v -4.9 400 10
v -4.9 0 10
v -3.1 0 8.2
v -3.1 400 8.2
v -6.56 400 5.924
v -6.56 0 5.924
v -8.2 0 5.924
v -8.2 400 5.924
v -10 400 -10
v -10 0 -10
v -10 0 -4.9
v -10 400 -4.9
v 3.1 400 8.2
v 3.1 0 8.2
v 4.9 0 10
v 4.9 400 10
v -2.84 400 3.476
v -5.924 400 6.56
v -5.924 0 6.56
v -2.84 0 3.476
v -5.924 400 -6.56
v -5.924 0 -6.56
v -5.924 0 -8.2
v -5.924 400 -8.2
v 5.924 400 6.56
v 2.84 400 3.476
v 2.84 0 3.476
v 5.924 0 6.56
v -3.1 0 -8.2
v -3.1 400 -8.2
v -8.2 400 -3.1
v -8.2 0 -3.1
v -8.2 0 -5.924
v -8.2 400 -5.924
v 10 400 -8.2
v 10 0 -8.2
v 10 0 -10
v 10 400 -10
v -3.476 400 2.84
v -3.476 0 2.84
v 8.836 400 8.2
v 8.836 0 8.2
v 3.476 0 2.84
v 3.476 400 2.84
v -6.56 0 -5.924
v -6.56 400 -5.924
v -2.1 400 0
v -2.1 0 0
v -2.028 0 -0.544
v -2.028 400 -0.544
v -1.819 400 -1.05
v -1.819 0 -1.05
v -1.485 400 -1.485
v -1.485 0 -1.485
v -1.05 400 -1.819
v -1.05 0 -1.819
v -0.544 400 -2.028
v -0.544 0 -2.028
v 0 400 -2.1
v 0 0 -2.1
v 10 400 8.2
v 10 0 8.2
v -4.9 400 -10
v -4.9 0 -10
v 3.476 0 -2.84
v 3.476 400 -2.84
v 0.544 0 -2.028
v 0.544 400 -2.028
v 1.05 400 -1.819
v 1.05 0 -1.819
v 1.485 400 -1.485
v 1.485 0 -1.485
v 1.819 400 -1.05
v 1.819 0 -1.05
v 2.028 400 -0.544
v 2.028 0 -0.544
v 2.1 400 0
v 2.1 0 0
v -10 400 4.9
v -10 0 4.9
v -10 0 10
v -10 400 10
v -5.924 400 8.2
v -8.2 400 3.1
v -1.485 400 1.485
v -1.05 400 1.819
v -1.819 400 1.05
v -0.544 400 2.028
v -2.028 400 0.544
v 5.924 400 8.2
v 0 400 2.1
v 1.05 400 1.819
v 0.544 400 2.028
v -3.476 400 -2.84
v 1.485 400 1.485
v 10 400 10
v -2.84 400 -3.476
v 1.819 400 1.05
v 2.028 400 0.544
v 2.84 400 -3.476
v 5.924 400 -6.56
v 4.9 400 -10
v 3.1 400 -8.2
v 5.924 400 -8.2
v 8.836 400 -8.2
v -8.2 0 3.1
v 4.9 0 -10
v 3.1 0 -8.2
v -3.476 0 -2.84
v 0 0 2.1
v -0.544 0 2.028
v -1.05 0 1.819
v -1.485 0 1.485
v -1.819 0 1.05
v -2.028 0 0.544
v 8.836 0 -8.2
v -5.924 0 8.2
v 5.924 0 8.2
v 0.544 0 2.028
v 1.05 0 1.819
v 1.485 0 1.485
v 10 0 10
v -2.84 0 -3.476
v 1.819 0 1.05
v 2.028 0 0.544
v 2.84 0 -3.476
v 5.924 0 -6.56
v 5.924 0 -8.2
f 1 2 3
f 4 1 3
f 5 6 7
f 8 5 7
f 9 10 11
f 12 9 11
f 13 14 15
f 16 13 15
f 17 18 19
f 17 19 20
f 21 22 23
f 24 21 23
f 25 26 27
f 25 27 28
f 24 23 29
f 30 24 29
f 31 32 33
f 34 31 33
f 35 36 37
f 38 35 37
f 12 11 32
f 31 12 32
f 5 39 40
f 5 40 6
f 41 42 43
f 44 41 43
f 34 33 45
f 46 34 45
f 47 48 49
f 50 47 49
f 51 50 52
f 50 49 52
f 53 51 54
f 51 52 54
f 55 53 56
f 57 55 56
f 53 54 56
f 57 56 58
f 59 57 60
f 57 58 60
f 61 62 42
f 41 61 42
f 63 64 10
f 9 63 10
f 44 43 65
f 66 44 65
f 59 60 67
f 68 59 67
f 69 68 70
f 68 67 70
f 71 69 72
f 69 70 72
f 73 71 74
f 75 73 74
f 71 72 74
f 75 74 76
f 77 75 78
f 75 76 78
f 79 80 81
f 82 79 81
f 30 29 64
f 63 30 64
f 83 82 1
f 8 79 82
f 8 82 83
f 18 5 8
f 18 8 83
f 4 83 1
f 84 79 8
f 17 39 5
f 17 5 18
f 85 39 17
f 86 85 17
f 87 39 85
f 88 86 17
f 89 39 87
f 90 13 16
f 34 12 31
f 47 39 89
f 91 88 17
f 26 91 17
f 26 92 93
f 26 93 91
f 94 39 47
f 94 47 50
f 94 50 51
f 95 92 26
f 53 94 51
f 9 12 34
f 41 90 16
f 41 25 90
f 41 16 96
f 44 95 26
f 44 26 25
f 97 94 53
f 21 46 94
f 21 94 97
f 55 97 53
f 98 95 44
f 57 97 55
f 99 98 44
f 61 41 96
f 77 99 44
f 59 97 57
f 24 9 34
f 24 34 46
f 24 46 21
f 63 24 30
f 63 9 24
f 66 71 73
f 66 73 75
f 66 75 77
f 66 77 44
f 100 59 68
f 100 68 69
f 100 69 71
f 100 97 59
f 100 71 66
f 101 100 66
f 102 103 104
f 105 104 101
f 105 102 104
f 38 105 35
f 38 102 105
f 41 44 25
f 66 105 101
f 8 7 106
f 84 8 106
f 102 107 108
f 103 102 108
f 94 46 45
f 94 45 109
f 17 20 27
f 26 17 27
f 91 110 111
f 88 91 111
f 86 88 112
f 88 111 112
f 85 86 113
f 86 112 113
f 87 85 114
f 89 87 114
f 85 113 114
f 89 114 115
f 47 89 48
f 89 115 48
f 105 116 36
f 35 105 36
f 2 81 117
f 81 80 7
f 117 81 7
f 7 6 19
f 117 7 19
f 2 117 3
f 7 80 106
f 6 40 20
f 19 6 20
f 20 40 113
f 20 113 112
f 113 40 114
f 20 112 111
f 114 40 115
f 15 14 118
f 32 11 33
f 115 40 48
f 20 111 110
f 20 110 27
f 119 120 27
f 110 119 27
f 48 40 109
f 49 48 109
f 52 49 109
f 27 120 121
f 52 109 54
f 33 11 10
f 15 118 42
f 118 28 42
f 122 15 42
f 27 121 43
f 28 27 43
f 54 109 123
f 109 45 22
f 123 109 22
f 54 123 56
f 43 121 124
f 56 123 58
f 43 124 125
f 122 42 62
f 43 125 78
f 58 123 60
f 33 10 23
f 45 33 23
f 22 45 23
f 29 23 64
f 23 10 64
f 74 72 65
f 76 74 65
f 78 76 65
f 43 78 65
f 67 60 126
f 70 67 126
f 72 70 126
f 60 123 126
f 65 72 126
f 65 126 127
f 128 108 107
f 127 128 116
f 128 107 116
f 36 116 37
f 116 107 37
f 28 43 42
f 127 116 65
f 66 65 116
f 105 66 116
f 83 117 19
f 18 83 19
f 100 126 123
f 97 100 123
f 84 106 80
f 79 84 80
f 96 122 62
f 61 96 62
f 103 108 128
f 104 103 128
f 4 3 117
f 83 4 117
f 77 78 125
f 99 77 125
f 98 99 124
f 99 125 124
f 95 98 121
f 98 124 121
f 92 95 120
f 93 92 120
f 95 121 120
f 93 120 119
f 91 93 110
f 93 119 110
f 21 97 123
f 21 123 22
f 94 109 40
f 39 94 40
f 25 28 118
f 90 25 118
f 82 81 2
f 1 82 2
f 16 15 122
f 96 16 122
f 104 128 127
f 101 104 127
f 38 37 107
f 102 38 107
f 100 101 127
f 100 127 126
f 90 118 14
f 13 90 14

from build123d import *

# Parameters (mm, degrees)
EXTRUDE_1_DEPTH          = 400
CUT_EXTRUDE_1_DEPTH      = 404.236903073
CUT_EXTRUDE_1_DEPTH_BACK = 404.236903073
SKETCH_2_W               = 44.352947912
SKETCH_2_H               = 26.447385174


with BuildPart() as part:
    # 草图1 → 凸台-拉伸1 (new body)
    with BuildSketch(Plane(origin=(0, 0, 0), x_dir=(1, 0, 0), z_dir=(0, 1, 0))):
        with BuildLine():
            Line((-3.476396103, 2.84), (-3.476396103, 0))
            Line((-3.476396103, 0), (-2.1, 0))
            ThreePointArc((-2.1, 0), (-1.48492424, 1.48492424), (0, 2.1))
            Line((0, 2.1), (0, 3.476396103))
            Line((0, 3.476396103), (-2.84, 3.476396103))
            Line((-2.84, 3.476396103), (-5.923603897, 6.56))
            Line((-5.923603897, 6.56), (-5.923603897, 8.2))
            Line((-5.923603897, 8.2), (-3.1, 8.2))
            Line((-3.1, 8.2), (-4.9, 10))
            Line((-4.9, 10), (-10, 10))
            Line((-10, 10), (-10, 4.9))
            Line((-10, 4.9), (-8.2, 3.1))
            Line((-8.2, 3.1), (-8.2, 5.923603897))
            Line((-8.2, 5.923603897), (-6.56, 5.923603897))
            Line((-6.56, 5.923603897), (-3.476396103, 2.84))
        make_face()
        with BuildLine():
            Line((-2.1, 0), (-3.476396103, 0))
            Line((-3.476396103, 0), (-3.476396103, -2.84))
            Line((-3.476396103, -2.84), (-6.56, -5.923603897))
            Line((-6.56, -5.923603897), (-8.2, -5.923603897))
            Line((-8.2, -5.923603897), (-8.2, -3.1))
            Line((-8.2, -3.1), (-10, -4.9))
            Line((-10, -4.9), (-10, -10))
            Line((-10, -10), (-4.9, -10))
            Line((-4.9, -10), (-3.1, -8.2))
            Line((-3.1, -8.2), (-5.923603897, -8.2))
            Line((-5.923603897, -8.2), (-5.923603897, -6.56))
            Line((-5.923603897, -6.56), (-2.84, -3.476396103))
            Line((-2.84, -3.476396103), (0, -3.476396103))
            Line((0, -3.476396103), (0, -2.1))
            ThreePointArc((0, -2.1), (-1.48492424, -1.48492424), (-2.1, 0))
        make_face()
        with BuildLine():
            ThreePointArc((2.1, 0), (1.48492424, -1.48492424), (0, -2.1))
            Line((0, -2.1), (0, -3.476396103))
            Line((0, -3.476396103), (2.84, -3.476396103))
            Line((2.84, -3.476396103), (5.923603897, -6.56))
            Line((5.923603897, -6.56), (5.923603897, -8.2))
            Line((5.923603897, -8.2), (3.1, -8.2))
            Line((3.1, -8.2), (4.9, -10))
            Line((4.9, -10), (15.1, -10))
            Line((15.1, -10), (16.9, -8.2))
            Line((16.9, -8.2), (14.076396103, -8.2))
            Line((14.076396103, -8.2), (14.076396103, -6.56))
            Line((14.076396103, -6.56), (17.16, -3.476396103))
            Line((17.16, -3.476396103), (20, -3.476396103))
            Line((20, -3.476396103), (20, -2.1))
            ThreePointArc((20, -2.1), (18.51507576, -1.48492424), (17.9, 0))
            Line((17.9, 0), (16.523603897, 0))
            Line((16.523603897, 0), (16.523603897, -2.84))
            Line((16.523603897, -2.84), (13.44, -5.923603897))
            Line((13.44, -5.923603897), (11.163603897, -8.2))
            Line((11.163603897, -8.2), (8.836396103, -8.2))
            Line((8.836396103, -8.2), (6.56, -5.923603897))
            Line((6.56, -5.923603897), (3.476396103, -2.84))
            Line((3.476396103, -2.84), (3.476396103, 0))
            Line((3.476396103, 0), (2.1, 0))
        make_face()
        with BuildLine():
            Line((0, 3.476396103), (0, 2.1))
            ThreePointArc((0, 2.1), (1.48492424, 1.48492424), (2.1, 0))
            Line((2.1, 0), (3.476396103, 0))
            Line((3.476396103, 0), (3.476396103, 2.84))
            Line((3.476396103, 2.84), (6.56, 5.923603897))
            Line((6.56, 5.923603897), (8.836396103, 8.2))
            Line((8.836396103, 8.2), (11.163603897, 8.2))
            Line((11.163603897, 8.2), (13.44, 5.923603897))
            Line((13.44, 5.923603897), (16.523603897, 2.84))
            Line((16.523603897, 2.84), (16.523603897, 0))
            Line((16.523603897, 0), (17.9, 0))
            ThreePointArc((17.9, 0), (18.51507576, 1.48492424), (20, 2.1))
            Line((20, 2.1), (20, 3.476396103))
            Line((20, 3.476396103), (17.16, 3.476396103))
            Line((17.16, 3.476396103), (14.076396103, 6.56))
            Line((14.076396103, 6.56), (14.076396103, 8.2))
            Line((14.076396103, 8.2), (16.9, 8.2))
            Line((16.9, 8.2), (15.1, 10))
            Line((15.1, 10), (4.9, 10))
            Line((4.9, 10), (3.1, 8.2))
            Line((3.1, 8.2), (5.923603897, 8.2))
            Line((5.923603897, 8.2), (5.923603897, 6.56))
            Line((5.923603897, 6.56), (2.84, 3.476396103))
            Line((2.84, 3.476396103), (0, 3.476396103))
        make_face()
        with BuildLine():
            Line((20, 3.476396103), (20, 2.1))
            ThreePointArc((20, 2.1), (21.48492424, 1.48492424), (22.1, 0))
            Line((22.1, 0), (23.476396103, 0))
            Line((23.476396103, 0), (23.476396103, 2.84))
            Line((23.476396103, 2.84), (26.56, 5.923603897))
            Line((26.56, 5.923603897), (28.836396103, 8.2))
            Line((28.836396103, 8.2), (31.163603897, 8.2))
            Line((31.163603897, 8.2), (33.44, 5.923603897))
            Line((33.44, 5.923603897), (36.523603897, 2.84))
            Line((36.523603897, 2.84), (36.523603897, 0))
            Line((36.523603897, 0), (37.9, 0))
            ThreePointArc((37.9, 0), (40, 2.1), (42.1, 0))
            Line((42.1, 0), (43.476396103, 0))
            Line((43.476396103, 0), (43.476396103, 2.84))
            Line((43.476396103, 2.84), (46.56, 5.923603897))
            Line((46.56, 5.923603897), (48.2, 5.923603897))
            Line((48.2, 5.923603897), (48.2, 3.1))
            Line((48.2, 3.1), (50, 4.9))
            Line((50, 4.9), (50, 10))
            Line((50, 10), (44.9, 10))
            Line((44.9, 10), (43.1, 8.2))
            Line((43.1, 8.2), (45.923603897, 8.2))
            Line((45.923603897, 8.2), (45.923603897, 6.56))
            Line((45.923603897, 6.56), (42.84, 3.476396103))
            Line((42.84, 3.476396103), (37.16, 3.476396103))
            Line((37.16, 3.476396103), (34.076396103, 6.56))
            Line((34.076396103, 6.56), (34.076396103, 8.2))
            Line((34.076396103, 8.2), (36.9, 8.2))
            Line((36.9, 8.2), (35.1, 10))
            Line((35.1, 10), (24.9, 10))
            Line((24.9, 10), (23.1, 8.2))
            Line((23.1, 8.2), (25.923603897, 8.2))
            Line((25.923603897, 8.2), (25.923603897, 6.56))
            Line((25.923603897, 6.56), (22.84, 3.476396103))
            Line((22.84, 3.476396103), (20, 3.476396103))
        make_face()
        with BuildLine():
            ThreePointArc((22.1, 0), (21.48492424, -1.48492424), (20, -2.1))
            Line((20, -2.1), (20, -3.476396103))
            Line((20, -3.476396103), (22.84, -3.476396103))
            Line((22.84, -3.476396103), (25.923603897, -6.56))
            Line((25.923603897, -6.56), (25.923603897, -8.2))
            Line((25.923603897, -8.2), (23.1, -8.2))
            Line((23.1, -8.2), (24.9, -10))
            Line((24.9, -10), (35.1, -10))
            Line((35.1, -10), (36.9, -8.2))
            Line((36.9, -8.2), (34.076396103, -8.2))
            Line((34.076396103, -8.2), (34.076396103, -6.56))
            Line((34.076396103, -6.56), (37.16, -3.476396103))
            Line((37.16, -3.476396103), (42.84, -3.476396103))
            Line((42.84, -3.476396103), (45.923603897, -6.56))
            Line((45.923603897, -6.56), (45.923603897, -8.2))
            Line((45.923603897, -8.2), (43.1, -8.2))
            Line((43.1, -8.2), (44.9, -10))
            Line((44.9, -10), (50, -10))
            Line((50, -10), (50, -4.9))
            Line((50, -4.9), (48.2, -3.1))
            Line((48.2, -3.1), (48.2, -5.923603897))
            Line((48.2, -5.923603897), (46.56, -5.923603897))
            Line((46.56, -5.923603897), (43.476396103, -2.84))
            Line((43.476396103, -2.84), (43.476396103, 0))
            Line((43.476396103, 0), (42.1, 0))
            ThreePointArc((42.1, 0), (40, -2.1), (37.9, 0))
            Line((37.9, 0), (36.523603897, 0))
            Line((36.523603897, 0), (36.523603897, -2.84))
            Line((36.523603897, -2.84), (33.44, -5.923603897))
            Line((33.44, -5.923603897), (31.163603897, -8.2))
            Line((31.163603897, -8.2), (28.836396103, -8.2))
            Line((28.836396103, -8.2), (26.56, -5.923603897))
            Line((26.56, -5.923603897), (23.476396103, -2.84))
            Line((23.476396103, -2.84), (23.476396103, 0))
            Line((23.476396103, 0), (22.1, 0))
        make_face()
    extrude(amount=EXTRUDE_1_DEPTH)

    # 草图2 → 切除-拉伸1 (cut, two sides: drawn at the far end of the back side and taken through both)
    with BuildSketch(Plane(origin=(0, 400, 0), x_dir=(1, 0, 0), z_dir=(0, 1, 0)).offset(-CUT_EXTRUDE_1_DEPTH_BACK)):
        with Locations((32.176473956, -3.223692587)):
            Rectangle(SKETCH_2_W, SKETCH_2_H)
    extrude(amount=CUT_EXTRUDE_1_DEPTH + CUT_EXTRUDE_1_DEPTH_BACK, mode=Mode.SUBTRACT)


solid = part.part
